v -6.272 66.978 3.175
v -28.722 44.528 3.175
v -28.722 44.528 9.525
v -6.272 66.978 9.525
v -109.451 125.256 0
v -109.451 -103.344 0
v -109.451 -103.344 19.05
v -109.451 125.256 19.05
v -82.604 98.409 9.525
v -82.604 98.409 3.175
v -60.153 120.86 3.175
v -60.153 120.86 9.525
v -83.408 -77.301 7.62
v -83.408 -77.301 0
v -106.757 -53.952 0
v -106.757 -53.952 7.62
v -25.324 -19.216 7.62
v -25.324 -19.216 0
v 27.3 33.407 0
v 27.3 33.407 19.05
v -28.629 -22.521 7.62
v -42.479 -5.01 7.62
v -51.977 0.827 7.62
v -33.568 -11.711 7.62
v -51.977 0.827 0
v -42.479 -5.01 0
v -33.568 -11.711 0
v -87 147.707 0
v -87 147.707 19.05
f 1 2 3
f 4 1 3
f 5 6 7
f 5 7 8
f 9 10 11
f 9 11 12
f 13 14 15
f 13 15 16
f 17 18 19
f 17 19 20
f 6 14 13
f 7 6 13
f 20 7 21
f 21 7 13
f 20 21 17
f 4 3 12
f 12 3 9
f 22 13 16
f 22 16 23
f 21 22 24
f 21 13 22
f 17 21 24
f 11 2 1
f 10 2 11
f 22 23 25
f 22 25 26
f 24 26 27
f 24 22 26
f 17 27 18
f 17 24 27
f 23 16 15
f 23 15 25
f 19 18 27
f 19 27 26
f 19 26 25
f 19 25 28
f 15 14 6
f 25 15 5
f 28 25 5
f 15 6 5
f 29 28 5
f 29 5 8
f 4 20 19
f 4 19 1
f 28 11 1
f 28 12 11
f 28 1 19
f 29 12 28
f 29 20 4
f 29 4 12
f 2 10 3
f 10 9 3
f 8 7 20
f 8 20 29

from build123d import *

# Parameters (mm, degrees)
F0_W      = 228.6
F0_H      = 228.6
F1_DEPTH  = 19.05
F3_DEPTH  = 19.051
F5_DEPTH  = 63.5
F7_W      = 77.47
F7_H      = 7.62
F8_DEPTH  = 33.02
F6_W      = 161.6446101792
F6_H      = 19.05
F6_W_2    = 76.2
F6_H_2    = 6.35
F9_DEPTH  = 31.75
F11_W     = 33.95681642
F11_H     = 16.0381817259
F12_ANGLE = 35


with BuildPart() as f1:
    # F0 (on Top) → F1 (new body)
    with BuildSketch(Plane.XY):
        with Locations((4.8490930349, 10.9562167545)):
            Rectangle(F0_W, F0_H)
    extrude(amount=F1_DEPTH)

    # F2 (on face) → F3 (cut, through all)
    with BuildSketch(Plane.XY.offset(19.05)):
        Polygon((155.7185798883, -103.3437832455), (119.1490930349, 125.2562167545), (-109.4509069651, -103.3437832455), align=None)
    extrude(amount=-F3_DEPTH, mode=Mode.SUBTRACT)

    # F4 (on face) → F5 (cut, symmetric)
    with BuildSketch(Plane.XY.offset(19.05)):
        Polygon((150.6341397762, 139.1298025846), (-109.4509069651, 125.2562167545), (4.8490930349, 10.9562167545), align=None)
    extrude(amount=F5_DEPTH, both=True, mode=Mode.SUBTRACT)

    # F7 (on face) → F8 (cut)
    with BuildSketch(Plane(origin=(-3.0535618598, 3.0535618598, 0), x_dir=(0.7071067812, 0.7071067812, 0), z_dir=(0.7071067812, -0.7071067812, 0))):
        with Locations((-74.9035684484, 3.81)):
            Rectangle(F7_W, F7_H)
    extrude(amount=-F8_DEPTH, mode=Mode.SUBTRACT)

    # F6 (on face) → F9 (join)
    with BuildSketch(Plane(origin=(7.9026548947, 7.9026548947, 0), x_dir=(-0.7071067812, 0.7071067812, 0), z_dir=(0.7071067812, 0.7071067812, 0))):
        with Locations((85.1406936854, 9.525)):
            Rectangle(F6_W, F6_H)
        with Locations((89.8955209156, 6.35)):
            Rectangle(F6_W_2, F6_H_2, mode=Mode.SUBTRACT)
    extrude(amount=F9_DEPTH)

    # F11 (on 3pt) → F12 (revolve, cut)
    with BuildSketch(Plane(origin=(-40.1975363097, 22.1779510674, 0), x_dir=(-0.4830773429, -0.875577684, 0), z_dir=(-0.875577684, 0.4830773429, 0))):
        with Locations((41.3631814837, -0.3990908629)):
            Rectangle(F11_W, F11_H)
    revolve(axis=Axis((-109.4509069651, -103.3437832455, 9.525), (0, 0, -1)), revolution_arc=F12_ANGLE, mode=Mode.SUBTRACT)


solid = f1.part
